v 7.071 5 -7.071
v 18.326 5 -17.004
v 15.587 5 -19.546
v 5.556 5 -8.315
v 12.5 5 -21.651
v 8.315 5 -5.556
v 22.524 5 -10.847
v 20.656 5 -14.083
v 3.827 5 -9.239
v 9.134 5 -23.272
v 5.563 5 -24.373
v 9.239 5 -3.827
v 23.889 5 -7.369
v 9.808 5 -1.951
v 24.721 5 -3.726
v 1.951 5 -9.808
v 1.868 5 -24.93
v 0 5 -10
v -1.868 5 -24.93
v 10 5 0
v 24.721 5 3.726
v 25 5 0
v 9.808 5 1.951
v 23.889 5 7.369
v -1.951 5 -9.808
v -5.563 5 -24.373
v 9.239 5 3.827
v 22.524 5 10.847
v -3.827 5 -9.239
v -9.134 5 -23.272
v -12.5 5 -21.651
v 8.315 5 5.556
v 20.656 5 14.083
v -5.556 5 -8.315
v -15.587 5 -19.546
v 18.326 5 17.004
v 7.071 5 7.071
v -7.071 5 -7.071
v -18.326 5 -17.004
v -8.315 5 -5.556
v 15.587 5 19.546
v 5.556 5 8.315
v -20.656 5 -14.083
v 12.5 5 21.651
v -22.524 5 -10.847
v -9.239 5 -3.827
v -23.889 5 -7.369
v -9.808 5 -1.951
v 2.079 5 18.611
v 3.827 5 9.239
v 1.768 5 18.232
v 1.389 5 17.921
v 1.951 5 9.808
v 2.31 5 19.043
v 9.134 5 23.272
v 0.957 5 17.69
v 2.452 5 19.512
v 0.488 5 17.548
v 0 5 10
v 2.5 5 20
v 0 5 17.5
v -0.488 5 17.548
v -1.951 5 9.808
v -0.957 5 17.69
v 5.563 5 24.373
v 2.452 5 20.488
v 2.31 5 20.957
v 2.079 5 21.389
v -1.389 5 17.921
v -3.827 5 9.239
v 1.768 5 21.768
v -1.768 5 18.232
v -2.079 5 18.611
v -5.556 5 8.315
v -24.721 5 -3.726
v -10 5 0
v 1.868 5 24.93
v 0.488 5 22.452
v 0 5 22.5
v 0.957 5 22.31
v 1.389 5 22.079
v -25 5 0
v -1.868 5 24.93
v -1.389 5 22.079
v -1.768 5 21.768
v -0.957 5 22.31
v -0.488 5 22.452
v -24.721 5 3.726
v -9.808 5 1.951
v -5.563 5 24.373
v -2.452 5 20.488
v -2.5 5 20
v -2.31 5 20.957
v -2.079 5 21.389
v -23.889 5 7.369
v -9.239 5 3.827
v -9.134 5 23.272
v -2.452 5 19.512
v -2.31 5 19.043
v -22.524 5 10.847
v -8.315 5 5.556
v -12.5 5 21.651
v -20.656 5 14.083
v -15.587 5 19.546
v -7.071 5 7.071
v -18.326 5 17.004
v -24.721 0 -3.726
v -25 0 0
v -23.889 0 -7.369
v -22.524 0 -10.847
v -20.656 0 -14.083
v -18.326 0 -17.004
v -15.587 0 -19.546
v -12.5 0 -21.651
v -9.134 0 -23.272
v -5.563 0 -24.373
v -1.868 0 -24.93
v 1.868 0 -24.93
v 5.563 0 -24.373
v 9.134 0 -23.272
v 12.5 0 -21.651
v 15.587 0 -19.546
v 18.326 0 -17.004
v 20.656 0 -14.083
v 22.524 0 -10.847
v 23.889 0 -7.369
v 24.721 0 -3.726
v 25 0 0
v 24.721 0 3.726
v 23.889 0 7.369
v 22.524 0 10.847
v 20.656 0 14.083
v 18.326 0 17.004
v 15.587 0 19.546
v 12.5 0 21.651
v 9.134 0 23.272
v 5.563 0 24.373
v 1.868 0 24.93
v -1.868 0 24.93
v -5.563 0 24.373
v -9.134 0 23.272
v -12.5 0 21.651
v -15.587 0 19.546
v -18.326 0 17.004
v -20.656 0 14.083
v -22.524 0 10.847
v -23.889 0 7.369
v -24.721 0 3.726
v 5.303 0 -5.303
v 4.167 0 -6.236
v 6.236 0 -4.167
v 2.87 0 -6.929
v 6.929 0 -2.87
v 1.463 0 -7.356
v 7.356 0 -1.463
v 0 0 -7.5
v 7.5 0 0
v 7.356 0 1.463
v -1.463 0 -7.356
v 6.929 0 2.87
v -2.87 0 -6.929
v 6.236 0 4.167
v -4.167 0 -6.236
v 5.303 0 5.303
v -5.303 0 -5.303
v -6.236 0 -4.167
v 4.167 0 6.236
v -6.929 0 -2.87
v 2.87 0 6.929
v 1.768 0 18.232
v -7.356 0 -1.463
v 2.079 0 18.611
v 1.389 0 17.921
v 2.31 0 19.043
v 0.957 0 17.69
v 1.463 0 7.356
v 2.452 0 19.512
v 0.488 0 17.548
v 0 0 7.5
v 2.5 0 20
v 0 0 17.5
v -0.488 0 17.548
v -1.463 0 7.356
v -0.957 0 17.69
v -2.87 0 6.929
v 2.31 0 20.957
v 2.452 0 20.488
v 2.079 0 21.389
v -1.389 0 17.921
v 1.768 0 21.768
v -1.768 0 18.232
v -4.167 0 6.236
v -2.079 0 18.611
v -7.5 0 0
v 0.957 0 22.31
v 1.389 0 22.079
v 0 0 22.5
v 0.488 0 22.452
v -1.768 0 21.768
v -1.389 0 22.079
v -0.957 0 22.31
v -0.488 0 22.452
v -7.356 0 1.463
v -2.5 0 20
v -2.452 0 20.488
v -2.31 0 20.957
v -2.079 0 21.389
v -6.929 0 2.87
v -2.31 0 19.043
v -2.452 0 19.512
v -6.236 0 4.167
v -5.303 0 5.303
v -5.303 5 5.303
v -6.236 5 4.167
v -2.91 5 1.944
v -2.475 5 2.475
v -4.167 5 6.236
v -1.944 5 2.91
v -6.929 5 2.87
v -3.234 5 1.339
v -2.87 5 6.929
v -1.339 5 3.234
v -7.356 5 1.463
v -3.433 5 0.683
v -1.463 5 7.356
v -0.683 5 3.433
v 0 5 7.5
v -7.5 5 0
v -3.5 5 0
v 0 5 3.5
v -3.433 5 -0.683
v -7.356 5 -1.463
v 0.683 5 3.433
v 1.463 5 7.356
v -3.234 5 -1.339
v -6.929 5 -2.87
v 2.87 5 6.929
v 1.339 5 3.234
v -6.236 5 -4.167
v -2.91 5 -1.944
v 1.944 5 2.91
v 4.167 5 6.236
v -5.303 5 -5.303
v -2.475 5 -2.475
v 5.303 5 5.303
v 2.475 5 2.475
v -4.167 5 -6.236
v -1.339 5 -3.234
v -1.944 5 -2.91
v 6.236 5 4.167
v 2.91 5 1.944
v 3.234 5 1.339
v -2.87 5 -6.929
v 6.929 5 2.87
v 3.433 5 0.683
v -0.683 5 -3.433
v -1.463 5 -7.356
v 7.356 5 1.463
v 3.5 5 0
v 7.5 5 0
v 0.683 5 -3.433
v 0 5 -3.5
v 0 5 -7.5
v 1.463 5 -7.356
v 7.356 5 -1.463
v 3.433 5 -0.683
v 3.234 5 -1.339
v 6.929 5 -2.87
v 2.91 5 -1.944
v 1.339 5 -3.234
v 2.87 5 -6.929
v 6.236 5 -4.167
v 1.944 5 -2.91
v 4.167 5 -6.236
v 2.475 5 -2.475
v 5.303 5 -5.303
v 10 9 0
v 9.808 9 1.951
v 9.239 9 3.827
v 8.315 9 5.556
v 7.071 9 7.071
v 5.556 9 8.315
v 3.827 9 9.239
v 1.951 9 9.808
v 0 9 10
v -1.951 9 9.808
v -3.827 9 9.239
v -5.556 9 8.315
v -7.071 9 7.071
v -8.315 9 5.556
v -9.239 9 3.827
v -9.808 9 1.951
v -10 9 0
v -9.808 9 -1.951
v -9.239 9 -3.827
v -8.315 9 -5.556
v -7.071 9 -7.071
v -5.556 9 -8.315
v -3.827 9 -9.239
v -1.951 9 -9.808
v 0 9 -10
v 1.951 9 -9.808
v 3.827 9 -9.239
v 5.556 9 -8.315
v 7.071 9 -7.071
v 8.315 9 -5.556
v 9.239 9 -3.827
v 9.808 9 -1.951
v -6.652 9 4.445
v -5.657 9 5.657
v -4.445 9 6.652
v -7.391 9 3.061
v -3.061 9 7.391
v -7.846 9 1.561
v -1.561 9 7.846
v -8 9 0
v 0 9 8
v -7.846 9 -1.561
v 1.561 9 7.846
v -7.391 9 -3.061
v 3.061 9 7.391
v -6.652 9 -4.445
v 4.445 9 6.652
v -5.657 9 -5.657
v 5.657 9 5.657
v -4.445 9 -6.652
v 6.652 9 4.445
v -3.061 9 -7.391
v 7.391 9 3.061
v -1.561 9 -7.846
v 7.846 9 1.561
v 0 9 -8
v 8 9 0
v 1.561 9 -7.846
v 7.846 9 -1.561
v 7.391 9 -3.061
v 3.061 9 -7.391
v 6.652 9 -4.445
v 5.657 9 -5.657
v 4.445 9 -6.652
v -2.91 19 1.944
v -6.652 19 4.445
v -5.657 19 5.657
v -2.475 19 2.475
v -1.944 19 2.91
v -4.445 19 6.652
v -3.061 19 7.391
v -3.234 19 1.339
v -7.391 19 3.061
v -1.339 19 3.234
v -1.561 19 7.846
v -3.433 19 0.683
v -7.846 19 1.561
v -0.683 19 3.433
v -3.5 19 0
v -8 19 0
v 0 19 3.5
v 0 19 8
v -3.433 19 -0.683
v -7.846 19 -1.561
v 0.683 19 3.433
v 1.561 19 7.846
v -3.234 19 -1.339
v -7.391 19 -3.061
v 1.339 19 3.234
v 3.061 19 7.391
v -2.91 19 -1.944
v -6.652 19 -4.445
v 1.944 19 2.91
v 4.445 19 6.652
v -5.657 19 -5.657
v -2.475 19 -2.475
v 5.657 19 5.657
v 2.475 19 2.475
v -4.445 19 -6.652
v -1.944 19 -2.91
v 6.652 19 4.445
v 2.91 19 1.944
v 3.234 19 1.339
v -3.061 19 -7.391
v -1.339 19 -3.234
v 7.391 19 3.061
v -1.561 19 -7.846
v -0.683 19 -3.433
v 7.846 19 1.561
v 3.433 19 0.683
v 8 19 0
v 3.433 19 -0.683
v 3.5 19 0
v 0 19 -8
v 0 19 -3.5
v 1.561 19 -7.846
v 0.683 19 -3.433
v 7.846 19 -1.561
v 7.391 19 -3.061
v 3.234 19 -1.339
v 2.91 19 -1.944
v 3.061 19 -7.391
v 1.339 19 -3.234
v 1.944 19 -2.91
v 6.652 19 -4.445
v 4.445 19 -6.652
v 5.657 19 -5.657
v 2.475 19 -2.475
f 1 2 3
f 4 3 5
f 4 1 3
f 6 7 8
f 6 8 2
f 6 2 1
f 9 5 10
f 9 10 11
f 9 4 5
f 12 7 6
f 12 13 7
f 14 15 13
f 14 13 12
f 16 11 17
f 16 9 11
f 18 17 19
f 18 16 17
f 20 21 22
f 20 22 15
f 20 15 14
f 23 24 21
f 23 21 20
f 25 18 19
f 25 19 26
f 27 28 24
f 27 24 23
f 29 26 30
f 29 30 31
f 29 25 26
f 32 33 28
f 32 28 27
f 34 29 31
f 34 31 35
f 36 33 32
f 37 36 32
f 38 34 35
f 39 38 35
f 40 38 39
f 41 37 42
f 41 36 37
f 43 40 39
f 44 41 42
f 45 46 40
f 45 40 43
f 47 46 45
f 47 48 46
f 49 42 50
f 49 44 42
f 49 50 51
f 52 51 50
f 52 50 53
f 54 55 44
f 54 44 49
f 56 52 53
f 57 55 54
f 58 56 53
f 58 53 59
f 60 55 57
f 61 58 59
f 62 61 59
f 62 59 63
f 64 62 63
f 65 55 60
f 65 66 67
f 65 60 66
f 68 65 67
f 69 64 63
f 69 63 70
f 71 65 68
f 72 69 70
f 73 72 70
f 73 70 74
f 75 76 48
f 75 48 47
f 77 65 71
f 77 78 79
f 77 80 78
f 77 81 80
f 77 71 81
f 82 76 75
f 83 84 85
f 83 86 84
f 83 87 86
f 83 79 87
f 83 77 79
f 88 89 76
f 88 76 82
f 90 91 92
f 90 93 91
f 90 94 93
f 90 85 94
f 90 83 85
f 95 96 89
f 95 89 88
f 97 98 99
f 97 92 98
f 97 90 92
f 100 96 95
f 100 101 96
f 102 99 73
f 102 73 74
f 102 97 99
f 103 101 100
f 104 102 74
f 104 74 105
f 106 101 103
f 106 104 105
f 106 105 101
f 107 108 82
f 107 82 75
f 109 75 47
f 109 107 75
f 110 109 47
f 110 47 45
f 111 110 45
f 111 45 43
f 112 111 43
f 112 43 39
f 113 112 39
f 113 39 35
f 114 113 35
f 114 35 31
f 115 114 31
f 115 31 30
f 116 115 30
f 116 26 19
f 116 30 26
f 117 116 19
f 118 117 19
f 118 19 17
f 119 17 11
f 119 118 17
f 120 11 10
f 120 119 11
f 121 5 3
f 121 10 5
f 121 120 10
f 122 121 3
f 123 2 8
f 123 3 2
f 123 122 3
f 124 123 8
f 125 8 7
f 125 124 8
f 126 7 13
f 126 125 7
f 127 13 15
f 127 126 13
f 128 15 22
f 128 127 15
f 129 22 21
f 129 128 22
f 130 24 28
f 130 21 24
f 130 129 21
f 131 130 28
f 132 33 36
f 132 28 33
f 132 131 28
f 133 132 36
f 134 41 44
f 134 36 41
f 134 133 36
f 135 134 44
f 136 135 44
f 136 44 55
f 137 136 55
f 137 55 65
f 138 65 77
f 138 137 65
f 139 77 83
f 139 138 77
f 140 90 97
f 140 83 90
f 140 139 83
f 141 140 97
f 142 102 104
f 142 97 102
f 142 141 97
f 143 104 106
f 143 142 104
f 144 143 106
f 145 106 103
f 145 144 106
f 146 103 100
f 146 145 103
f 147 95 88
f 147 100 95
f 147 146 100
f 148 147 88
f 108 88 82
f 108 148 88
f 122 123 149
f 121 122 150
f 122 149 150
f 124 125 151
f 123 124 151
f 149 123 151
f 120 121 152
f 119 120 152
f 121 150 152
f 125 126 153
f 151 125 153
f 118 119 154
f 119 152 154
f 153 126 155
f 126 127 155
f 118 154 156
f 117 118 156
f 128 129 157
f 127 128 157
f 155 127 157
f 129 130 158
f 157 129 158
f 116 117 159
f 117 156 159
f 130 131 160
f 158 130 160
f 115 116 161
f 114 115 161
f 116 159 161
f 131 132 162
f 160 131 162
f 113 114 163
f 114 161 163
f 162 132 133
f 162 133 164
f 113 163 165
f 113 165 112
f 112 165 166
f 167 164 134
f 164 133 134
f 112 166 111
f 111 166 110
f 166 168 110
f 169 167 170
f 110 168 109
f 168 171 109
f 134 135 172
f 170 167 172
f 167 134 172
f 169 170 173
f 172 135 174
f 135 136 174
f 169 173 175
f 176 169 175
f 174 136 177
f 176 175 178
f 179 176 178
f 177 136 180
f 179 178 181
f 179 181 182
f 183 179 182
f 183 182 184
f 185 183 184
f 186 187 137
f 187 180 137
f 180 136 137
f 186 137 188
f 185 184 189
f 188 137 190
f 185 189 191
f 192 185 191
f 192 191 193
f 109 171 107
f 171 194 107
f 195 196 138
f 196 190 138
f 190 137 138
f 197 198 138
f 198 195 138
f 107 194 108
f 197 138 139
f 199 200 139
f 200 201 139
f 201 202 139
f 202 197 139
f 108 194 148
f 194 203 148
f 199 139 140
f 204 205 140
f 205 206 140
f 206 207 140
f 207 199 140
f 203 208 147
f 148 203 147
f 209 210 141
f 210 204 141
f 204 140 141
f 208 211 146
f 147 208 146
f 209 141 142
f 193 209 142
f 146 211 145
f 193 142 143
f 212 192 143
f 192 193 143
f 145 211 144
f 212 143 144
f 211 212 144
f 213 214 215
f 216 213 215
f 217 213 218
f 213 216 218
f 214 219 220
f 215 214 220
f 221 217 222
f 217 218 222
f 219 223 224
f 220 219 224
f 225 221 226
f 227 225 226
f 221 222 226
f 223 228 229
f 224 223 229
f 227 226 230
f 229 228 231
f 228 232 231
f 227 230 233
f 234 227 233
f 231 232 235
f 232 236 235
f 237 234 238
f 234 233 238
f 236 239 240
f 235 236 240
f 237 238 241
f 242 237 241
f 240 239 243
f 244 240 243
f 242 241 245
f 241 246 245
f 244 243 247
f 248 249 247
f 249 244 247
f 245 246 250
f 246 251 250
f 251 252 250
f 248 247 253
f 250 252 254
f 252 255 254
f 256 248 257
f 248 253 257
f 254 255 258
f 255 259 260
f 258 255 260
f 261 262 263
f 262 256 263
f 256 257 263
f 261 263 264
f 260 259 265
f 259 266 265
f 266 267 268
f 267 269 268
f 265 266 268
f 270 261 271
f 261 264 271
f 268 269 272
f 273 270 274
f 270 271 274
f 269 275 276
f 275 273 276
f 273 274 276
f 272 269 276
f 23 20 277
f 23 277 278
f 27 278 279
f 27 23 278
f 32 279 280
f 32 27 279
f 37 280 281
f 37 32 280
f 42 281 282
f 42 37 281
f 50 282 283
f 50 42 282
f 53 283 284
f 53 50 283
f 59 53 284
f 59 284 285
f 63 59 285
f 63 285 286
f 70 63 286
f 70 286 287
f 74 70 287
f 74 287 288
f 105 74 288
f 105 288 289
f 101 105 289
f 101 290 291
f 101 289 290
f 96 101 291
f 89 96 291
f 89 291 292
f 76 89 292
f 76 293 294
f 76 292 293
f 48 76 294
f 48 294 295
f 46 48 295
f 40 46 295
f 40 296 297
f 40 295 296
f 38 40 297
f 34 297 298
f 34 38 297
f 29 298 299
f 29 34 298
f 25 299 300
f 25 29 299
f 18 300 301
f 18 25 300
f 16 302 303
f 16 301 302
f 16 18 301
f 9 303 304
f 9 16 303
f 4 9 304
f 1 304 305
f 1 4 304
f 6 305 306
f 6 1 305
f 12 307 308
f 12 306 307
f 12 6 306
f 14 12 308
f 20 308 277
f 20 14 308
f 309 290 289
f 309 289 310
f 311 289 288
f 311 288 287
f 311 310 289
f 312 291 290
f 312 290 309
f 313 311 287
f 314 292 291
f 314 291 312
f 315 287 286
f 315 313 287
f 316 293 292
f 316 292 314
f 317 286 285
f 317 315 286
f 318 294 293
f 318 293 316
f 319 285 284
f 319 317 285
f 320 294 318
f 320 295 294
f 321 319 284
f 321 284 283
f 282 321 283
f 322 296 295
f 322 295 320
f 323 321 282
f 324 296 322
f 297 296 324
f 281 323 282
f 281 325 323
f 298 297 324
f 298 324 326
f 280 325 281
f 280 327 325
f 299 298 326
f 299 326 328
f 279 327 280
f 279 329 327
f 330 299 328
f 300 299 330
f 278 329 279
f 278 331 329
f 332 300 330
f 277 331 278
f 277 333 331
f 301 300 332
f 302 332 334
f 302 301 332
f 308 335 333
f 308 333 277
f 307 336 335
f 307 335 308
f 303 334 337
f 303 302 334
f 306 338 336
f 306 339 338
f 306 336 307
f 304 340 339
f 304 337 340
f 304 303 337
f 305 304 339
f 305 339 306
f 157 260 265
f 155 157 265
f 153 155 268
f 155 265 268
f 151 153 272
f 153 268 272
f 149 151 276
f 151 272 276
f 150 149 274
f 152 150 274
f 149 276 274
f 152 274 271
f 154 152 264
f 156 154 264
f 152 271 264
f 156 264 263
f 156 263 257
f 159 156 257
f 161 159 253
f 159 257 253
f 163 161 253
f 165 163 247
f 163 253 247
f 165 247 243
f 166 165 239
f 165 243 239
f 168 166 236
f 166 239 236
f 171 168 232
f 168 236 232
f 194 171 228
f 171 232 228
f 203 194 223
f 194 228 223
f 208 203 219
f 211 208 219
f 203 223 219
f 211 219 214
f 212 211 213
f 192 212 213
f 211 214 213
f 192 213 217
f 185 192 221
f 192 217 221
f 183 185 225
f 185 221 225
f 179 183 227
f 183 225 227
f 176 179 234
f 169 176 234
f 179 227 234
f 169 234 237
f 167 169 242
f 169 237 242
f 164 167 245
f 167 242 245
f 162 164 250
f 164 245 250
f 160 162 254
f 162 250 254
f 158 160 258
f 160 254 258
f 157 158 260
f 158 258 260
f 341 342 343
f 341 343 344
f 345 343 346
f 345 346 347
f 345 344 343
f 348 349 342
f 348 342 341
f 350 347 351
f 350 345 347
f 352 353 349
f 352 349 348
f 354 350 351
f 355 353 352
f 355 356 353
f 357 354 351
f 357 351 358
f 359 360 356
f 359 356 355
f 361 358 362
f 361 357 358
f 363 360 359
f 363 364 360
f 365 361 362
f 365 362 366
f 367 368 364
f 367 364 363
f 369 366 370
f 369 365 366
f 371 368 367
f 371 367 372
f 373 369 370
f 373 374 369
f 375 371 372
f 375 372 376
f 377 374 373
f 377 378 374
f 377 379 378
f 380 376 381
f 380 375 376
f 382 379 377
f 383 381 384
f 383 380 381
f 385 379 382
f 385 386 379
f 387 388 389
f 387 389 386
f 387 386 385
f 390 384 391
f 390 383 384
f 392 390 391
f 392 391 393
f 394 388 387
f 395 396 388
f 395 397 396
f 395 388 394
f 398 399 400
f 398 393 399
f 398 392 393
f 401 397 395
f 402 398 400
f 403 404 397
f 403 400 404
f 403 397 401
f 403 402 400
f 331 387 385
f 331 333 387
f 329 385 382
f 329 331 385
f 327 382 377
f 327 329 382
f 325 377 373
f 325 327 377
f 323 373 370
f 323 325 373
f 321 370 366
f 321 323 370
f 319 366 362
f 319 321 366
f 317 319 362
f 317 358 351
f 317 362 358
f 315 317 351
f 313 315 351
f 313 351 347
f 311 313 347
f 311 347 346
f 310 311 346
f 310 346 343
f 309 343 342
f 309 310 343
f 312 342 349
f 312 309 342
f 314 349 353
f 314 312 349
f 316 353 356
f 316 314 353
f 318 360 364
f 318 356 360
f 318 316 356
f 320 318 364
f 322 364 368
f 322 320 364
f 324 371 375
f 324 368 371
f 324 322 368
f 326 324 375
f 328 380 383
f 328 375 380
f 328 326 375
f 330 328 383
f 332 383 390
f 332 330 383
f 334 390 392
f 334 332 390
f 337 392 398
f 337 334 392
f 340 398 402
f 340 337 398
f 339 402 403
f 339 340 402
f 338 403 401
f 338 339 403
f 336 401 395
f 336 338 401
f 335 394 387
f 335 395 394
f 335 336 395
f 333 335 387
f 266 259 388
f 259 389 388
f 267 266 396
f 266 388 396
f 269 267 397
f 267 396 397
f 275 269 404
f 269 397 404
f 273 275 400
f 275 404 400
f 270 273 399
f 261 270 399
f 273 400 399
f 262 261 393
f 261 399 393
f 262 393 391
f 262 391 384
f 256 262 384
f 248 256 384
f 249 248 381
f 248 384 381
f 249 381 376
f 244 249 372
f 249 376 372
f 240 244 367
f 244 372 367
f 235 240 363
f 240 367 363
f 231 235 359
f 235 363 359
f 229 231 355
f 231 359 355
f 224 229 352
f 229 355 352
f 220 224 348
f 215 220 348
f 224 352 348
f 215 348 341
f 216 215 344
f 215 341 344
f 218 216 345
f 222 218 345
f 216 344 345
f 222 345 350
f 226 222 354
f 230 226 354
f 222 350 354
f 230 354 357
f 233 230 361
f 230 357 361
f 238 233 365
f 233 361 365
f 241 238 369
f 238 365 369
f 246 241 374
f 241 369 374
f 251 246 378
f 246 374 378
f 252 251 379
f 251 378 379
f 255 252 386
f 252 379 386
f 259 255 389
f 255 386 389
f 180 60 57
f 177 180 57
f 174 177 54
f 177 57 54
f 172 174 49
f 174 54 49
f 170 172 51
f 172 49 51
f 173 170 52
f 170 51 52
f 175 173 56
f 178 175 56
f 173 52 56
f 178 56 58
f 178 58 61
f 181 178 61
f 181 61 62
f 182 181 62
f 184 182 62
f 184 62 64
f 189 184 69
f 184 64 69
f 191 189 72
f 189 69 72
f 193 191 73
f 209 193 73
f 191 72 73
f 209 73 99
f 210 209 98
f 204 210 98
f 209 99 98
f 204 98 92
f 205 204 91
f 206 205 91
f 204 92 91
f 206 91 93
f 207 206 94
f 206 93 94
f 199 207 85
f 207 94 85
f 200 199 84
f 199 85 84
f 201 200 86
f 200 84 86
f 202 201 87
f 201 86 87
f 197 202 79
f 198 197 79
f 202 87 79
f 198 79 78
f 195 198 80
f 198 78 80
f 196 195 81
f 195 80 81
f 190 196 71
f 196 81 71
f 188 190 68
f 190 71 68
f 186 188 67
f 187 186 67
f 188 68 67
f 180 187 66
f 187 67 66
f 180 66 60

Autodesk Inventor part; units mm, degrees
ref_plane "YZ Plane" through (0, 0, 0) normal (1, 0, 0) x (0, 1, 0)
ref_plane "XZ Plane" through (0, 0, 0) normal (0, 1, 0) x (-1, 0, 0)
ref_plane "XY Plane" through (0, 0, 0) normal (0, 0, 1) x (1, 0, 0)
sketch "Sketch1" plane through (0, 0, 0) normal (0, 1, 0) x (-1, 0, 0)
  circle A0 centre (0, 0) radius 25
  dimension "d0" = 50
extrude "Extrusion1" add sketch "Sketch1" along normal blind 5
sketch "Sketch2" plane through (0, 5, 0) normal (0, 1, 0) x (1, 0, 0)
  circle A0 centre (0, 0) radius 7.5
  dimension "d3" = 15
extrude "Extrusion2" cut sketch "Sketch2" against normal through all
sketch "Sketch4" plane through (0, 5, 0) normal (0, 1, 0) x (1, 0, 0)
  circle A0 centre (0, 0) radius 20 construction
  circle A1 centre (0, -20) radius 2.5
  dimension "d8" = 40
  dimension "d9" = 5
extrude "Extrusion3" cut sketch "Sketch4" against normal through all
sketch "Sketch5" plane through (0, 0, 0) normal (0, -1, 0) x (1, 0, 0)
  line L0 (0, 0) -> (0, 34) construction
  circle A0 centre (0, 20) radius 2.5 construction
  circle A1 centre (0, 0) radius 7.5 construction
  circle A2 centre (0, 0) radius 25 construction
sketch "Sketch6" plane through (0, 5, 0) normal (0, 1, 0) x (1, 0, 0)
  circle A0 centre (0, 0) radius 10
  dimension "d12" = 20
extrude "Extrusion4" add sketch "Sketch6" along normal blind 4
sketch "Sketch7" plane through (0, 9, 0) normal (0, 1, 0) x (1, 0, 0)
  circle A0 centre (0, 0) radius 8
  dimension "d15" = 16
extrude "Extrusion5" add sketch "Sketch7" along normal blind 10
sketch "Sketch8" plane through (0, 19, 0) normal (0, 1, 0) x (1, 0, 0)
  circle A0 centre (0, 0) radius 3.5
  dimension "d18" = 7
extrude "Extrusion6" cut sketch "Sketch8" against normal through all
properties part number "sprzeglo_01"
